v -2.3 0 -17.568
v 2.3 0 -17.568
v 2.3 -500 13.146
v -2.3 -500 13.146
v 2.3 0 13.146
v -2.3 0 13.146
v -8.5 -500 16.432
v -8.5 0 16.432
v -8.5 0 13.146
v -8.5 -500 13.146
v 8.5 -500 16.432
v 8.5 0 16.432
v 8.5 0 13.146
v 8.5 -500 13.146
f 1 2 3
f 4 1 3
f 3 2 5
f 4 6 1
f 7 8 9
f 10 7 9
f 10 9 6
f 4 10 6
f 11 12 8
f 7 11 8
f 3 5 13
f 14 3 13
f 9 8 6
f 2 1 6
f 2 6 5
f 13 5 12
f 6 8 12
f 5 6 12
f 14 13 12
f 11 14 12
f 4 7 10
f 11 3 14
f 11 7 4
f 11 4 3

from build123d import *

# Parameters (mm, degrees)
F1_DEPTH = 500
F3_DEPTH = 100


with BuildPart() as f1:
    # F0 (on Front) → F1 (new body)
    with BuildSketch(Plane.XZ):
        Polygon((0, 16.431924), (-8.5, 16.431924), (-8.5, 13.145539), (-2.30047, 13.145539), (-2.30047, -17.568076), (0, -17.568076), (2.30047, -17.568076), (2.30047, 13.145539), (8.5, 13.145539), (8.5, 16.431924), align=None)
    extrude(amount=F1_DEPTH)

    # F2 (on face) → F3 (cut)
    with BuildSketch(Plane.YZ.offset(2.30047)):
        Polygon((0, -17.568076), (-500, 13.145539), (-500, -17.568076), align=None)
    extrude(amount=-F3_DEPTH, mode=Mode.SUBTRACT)


solid = f1.part
